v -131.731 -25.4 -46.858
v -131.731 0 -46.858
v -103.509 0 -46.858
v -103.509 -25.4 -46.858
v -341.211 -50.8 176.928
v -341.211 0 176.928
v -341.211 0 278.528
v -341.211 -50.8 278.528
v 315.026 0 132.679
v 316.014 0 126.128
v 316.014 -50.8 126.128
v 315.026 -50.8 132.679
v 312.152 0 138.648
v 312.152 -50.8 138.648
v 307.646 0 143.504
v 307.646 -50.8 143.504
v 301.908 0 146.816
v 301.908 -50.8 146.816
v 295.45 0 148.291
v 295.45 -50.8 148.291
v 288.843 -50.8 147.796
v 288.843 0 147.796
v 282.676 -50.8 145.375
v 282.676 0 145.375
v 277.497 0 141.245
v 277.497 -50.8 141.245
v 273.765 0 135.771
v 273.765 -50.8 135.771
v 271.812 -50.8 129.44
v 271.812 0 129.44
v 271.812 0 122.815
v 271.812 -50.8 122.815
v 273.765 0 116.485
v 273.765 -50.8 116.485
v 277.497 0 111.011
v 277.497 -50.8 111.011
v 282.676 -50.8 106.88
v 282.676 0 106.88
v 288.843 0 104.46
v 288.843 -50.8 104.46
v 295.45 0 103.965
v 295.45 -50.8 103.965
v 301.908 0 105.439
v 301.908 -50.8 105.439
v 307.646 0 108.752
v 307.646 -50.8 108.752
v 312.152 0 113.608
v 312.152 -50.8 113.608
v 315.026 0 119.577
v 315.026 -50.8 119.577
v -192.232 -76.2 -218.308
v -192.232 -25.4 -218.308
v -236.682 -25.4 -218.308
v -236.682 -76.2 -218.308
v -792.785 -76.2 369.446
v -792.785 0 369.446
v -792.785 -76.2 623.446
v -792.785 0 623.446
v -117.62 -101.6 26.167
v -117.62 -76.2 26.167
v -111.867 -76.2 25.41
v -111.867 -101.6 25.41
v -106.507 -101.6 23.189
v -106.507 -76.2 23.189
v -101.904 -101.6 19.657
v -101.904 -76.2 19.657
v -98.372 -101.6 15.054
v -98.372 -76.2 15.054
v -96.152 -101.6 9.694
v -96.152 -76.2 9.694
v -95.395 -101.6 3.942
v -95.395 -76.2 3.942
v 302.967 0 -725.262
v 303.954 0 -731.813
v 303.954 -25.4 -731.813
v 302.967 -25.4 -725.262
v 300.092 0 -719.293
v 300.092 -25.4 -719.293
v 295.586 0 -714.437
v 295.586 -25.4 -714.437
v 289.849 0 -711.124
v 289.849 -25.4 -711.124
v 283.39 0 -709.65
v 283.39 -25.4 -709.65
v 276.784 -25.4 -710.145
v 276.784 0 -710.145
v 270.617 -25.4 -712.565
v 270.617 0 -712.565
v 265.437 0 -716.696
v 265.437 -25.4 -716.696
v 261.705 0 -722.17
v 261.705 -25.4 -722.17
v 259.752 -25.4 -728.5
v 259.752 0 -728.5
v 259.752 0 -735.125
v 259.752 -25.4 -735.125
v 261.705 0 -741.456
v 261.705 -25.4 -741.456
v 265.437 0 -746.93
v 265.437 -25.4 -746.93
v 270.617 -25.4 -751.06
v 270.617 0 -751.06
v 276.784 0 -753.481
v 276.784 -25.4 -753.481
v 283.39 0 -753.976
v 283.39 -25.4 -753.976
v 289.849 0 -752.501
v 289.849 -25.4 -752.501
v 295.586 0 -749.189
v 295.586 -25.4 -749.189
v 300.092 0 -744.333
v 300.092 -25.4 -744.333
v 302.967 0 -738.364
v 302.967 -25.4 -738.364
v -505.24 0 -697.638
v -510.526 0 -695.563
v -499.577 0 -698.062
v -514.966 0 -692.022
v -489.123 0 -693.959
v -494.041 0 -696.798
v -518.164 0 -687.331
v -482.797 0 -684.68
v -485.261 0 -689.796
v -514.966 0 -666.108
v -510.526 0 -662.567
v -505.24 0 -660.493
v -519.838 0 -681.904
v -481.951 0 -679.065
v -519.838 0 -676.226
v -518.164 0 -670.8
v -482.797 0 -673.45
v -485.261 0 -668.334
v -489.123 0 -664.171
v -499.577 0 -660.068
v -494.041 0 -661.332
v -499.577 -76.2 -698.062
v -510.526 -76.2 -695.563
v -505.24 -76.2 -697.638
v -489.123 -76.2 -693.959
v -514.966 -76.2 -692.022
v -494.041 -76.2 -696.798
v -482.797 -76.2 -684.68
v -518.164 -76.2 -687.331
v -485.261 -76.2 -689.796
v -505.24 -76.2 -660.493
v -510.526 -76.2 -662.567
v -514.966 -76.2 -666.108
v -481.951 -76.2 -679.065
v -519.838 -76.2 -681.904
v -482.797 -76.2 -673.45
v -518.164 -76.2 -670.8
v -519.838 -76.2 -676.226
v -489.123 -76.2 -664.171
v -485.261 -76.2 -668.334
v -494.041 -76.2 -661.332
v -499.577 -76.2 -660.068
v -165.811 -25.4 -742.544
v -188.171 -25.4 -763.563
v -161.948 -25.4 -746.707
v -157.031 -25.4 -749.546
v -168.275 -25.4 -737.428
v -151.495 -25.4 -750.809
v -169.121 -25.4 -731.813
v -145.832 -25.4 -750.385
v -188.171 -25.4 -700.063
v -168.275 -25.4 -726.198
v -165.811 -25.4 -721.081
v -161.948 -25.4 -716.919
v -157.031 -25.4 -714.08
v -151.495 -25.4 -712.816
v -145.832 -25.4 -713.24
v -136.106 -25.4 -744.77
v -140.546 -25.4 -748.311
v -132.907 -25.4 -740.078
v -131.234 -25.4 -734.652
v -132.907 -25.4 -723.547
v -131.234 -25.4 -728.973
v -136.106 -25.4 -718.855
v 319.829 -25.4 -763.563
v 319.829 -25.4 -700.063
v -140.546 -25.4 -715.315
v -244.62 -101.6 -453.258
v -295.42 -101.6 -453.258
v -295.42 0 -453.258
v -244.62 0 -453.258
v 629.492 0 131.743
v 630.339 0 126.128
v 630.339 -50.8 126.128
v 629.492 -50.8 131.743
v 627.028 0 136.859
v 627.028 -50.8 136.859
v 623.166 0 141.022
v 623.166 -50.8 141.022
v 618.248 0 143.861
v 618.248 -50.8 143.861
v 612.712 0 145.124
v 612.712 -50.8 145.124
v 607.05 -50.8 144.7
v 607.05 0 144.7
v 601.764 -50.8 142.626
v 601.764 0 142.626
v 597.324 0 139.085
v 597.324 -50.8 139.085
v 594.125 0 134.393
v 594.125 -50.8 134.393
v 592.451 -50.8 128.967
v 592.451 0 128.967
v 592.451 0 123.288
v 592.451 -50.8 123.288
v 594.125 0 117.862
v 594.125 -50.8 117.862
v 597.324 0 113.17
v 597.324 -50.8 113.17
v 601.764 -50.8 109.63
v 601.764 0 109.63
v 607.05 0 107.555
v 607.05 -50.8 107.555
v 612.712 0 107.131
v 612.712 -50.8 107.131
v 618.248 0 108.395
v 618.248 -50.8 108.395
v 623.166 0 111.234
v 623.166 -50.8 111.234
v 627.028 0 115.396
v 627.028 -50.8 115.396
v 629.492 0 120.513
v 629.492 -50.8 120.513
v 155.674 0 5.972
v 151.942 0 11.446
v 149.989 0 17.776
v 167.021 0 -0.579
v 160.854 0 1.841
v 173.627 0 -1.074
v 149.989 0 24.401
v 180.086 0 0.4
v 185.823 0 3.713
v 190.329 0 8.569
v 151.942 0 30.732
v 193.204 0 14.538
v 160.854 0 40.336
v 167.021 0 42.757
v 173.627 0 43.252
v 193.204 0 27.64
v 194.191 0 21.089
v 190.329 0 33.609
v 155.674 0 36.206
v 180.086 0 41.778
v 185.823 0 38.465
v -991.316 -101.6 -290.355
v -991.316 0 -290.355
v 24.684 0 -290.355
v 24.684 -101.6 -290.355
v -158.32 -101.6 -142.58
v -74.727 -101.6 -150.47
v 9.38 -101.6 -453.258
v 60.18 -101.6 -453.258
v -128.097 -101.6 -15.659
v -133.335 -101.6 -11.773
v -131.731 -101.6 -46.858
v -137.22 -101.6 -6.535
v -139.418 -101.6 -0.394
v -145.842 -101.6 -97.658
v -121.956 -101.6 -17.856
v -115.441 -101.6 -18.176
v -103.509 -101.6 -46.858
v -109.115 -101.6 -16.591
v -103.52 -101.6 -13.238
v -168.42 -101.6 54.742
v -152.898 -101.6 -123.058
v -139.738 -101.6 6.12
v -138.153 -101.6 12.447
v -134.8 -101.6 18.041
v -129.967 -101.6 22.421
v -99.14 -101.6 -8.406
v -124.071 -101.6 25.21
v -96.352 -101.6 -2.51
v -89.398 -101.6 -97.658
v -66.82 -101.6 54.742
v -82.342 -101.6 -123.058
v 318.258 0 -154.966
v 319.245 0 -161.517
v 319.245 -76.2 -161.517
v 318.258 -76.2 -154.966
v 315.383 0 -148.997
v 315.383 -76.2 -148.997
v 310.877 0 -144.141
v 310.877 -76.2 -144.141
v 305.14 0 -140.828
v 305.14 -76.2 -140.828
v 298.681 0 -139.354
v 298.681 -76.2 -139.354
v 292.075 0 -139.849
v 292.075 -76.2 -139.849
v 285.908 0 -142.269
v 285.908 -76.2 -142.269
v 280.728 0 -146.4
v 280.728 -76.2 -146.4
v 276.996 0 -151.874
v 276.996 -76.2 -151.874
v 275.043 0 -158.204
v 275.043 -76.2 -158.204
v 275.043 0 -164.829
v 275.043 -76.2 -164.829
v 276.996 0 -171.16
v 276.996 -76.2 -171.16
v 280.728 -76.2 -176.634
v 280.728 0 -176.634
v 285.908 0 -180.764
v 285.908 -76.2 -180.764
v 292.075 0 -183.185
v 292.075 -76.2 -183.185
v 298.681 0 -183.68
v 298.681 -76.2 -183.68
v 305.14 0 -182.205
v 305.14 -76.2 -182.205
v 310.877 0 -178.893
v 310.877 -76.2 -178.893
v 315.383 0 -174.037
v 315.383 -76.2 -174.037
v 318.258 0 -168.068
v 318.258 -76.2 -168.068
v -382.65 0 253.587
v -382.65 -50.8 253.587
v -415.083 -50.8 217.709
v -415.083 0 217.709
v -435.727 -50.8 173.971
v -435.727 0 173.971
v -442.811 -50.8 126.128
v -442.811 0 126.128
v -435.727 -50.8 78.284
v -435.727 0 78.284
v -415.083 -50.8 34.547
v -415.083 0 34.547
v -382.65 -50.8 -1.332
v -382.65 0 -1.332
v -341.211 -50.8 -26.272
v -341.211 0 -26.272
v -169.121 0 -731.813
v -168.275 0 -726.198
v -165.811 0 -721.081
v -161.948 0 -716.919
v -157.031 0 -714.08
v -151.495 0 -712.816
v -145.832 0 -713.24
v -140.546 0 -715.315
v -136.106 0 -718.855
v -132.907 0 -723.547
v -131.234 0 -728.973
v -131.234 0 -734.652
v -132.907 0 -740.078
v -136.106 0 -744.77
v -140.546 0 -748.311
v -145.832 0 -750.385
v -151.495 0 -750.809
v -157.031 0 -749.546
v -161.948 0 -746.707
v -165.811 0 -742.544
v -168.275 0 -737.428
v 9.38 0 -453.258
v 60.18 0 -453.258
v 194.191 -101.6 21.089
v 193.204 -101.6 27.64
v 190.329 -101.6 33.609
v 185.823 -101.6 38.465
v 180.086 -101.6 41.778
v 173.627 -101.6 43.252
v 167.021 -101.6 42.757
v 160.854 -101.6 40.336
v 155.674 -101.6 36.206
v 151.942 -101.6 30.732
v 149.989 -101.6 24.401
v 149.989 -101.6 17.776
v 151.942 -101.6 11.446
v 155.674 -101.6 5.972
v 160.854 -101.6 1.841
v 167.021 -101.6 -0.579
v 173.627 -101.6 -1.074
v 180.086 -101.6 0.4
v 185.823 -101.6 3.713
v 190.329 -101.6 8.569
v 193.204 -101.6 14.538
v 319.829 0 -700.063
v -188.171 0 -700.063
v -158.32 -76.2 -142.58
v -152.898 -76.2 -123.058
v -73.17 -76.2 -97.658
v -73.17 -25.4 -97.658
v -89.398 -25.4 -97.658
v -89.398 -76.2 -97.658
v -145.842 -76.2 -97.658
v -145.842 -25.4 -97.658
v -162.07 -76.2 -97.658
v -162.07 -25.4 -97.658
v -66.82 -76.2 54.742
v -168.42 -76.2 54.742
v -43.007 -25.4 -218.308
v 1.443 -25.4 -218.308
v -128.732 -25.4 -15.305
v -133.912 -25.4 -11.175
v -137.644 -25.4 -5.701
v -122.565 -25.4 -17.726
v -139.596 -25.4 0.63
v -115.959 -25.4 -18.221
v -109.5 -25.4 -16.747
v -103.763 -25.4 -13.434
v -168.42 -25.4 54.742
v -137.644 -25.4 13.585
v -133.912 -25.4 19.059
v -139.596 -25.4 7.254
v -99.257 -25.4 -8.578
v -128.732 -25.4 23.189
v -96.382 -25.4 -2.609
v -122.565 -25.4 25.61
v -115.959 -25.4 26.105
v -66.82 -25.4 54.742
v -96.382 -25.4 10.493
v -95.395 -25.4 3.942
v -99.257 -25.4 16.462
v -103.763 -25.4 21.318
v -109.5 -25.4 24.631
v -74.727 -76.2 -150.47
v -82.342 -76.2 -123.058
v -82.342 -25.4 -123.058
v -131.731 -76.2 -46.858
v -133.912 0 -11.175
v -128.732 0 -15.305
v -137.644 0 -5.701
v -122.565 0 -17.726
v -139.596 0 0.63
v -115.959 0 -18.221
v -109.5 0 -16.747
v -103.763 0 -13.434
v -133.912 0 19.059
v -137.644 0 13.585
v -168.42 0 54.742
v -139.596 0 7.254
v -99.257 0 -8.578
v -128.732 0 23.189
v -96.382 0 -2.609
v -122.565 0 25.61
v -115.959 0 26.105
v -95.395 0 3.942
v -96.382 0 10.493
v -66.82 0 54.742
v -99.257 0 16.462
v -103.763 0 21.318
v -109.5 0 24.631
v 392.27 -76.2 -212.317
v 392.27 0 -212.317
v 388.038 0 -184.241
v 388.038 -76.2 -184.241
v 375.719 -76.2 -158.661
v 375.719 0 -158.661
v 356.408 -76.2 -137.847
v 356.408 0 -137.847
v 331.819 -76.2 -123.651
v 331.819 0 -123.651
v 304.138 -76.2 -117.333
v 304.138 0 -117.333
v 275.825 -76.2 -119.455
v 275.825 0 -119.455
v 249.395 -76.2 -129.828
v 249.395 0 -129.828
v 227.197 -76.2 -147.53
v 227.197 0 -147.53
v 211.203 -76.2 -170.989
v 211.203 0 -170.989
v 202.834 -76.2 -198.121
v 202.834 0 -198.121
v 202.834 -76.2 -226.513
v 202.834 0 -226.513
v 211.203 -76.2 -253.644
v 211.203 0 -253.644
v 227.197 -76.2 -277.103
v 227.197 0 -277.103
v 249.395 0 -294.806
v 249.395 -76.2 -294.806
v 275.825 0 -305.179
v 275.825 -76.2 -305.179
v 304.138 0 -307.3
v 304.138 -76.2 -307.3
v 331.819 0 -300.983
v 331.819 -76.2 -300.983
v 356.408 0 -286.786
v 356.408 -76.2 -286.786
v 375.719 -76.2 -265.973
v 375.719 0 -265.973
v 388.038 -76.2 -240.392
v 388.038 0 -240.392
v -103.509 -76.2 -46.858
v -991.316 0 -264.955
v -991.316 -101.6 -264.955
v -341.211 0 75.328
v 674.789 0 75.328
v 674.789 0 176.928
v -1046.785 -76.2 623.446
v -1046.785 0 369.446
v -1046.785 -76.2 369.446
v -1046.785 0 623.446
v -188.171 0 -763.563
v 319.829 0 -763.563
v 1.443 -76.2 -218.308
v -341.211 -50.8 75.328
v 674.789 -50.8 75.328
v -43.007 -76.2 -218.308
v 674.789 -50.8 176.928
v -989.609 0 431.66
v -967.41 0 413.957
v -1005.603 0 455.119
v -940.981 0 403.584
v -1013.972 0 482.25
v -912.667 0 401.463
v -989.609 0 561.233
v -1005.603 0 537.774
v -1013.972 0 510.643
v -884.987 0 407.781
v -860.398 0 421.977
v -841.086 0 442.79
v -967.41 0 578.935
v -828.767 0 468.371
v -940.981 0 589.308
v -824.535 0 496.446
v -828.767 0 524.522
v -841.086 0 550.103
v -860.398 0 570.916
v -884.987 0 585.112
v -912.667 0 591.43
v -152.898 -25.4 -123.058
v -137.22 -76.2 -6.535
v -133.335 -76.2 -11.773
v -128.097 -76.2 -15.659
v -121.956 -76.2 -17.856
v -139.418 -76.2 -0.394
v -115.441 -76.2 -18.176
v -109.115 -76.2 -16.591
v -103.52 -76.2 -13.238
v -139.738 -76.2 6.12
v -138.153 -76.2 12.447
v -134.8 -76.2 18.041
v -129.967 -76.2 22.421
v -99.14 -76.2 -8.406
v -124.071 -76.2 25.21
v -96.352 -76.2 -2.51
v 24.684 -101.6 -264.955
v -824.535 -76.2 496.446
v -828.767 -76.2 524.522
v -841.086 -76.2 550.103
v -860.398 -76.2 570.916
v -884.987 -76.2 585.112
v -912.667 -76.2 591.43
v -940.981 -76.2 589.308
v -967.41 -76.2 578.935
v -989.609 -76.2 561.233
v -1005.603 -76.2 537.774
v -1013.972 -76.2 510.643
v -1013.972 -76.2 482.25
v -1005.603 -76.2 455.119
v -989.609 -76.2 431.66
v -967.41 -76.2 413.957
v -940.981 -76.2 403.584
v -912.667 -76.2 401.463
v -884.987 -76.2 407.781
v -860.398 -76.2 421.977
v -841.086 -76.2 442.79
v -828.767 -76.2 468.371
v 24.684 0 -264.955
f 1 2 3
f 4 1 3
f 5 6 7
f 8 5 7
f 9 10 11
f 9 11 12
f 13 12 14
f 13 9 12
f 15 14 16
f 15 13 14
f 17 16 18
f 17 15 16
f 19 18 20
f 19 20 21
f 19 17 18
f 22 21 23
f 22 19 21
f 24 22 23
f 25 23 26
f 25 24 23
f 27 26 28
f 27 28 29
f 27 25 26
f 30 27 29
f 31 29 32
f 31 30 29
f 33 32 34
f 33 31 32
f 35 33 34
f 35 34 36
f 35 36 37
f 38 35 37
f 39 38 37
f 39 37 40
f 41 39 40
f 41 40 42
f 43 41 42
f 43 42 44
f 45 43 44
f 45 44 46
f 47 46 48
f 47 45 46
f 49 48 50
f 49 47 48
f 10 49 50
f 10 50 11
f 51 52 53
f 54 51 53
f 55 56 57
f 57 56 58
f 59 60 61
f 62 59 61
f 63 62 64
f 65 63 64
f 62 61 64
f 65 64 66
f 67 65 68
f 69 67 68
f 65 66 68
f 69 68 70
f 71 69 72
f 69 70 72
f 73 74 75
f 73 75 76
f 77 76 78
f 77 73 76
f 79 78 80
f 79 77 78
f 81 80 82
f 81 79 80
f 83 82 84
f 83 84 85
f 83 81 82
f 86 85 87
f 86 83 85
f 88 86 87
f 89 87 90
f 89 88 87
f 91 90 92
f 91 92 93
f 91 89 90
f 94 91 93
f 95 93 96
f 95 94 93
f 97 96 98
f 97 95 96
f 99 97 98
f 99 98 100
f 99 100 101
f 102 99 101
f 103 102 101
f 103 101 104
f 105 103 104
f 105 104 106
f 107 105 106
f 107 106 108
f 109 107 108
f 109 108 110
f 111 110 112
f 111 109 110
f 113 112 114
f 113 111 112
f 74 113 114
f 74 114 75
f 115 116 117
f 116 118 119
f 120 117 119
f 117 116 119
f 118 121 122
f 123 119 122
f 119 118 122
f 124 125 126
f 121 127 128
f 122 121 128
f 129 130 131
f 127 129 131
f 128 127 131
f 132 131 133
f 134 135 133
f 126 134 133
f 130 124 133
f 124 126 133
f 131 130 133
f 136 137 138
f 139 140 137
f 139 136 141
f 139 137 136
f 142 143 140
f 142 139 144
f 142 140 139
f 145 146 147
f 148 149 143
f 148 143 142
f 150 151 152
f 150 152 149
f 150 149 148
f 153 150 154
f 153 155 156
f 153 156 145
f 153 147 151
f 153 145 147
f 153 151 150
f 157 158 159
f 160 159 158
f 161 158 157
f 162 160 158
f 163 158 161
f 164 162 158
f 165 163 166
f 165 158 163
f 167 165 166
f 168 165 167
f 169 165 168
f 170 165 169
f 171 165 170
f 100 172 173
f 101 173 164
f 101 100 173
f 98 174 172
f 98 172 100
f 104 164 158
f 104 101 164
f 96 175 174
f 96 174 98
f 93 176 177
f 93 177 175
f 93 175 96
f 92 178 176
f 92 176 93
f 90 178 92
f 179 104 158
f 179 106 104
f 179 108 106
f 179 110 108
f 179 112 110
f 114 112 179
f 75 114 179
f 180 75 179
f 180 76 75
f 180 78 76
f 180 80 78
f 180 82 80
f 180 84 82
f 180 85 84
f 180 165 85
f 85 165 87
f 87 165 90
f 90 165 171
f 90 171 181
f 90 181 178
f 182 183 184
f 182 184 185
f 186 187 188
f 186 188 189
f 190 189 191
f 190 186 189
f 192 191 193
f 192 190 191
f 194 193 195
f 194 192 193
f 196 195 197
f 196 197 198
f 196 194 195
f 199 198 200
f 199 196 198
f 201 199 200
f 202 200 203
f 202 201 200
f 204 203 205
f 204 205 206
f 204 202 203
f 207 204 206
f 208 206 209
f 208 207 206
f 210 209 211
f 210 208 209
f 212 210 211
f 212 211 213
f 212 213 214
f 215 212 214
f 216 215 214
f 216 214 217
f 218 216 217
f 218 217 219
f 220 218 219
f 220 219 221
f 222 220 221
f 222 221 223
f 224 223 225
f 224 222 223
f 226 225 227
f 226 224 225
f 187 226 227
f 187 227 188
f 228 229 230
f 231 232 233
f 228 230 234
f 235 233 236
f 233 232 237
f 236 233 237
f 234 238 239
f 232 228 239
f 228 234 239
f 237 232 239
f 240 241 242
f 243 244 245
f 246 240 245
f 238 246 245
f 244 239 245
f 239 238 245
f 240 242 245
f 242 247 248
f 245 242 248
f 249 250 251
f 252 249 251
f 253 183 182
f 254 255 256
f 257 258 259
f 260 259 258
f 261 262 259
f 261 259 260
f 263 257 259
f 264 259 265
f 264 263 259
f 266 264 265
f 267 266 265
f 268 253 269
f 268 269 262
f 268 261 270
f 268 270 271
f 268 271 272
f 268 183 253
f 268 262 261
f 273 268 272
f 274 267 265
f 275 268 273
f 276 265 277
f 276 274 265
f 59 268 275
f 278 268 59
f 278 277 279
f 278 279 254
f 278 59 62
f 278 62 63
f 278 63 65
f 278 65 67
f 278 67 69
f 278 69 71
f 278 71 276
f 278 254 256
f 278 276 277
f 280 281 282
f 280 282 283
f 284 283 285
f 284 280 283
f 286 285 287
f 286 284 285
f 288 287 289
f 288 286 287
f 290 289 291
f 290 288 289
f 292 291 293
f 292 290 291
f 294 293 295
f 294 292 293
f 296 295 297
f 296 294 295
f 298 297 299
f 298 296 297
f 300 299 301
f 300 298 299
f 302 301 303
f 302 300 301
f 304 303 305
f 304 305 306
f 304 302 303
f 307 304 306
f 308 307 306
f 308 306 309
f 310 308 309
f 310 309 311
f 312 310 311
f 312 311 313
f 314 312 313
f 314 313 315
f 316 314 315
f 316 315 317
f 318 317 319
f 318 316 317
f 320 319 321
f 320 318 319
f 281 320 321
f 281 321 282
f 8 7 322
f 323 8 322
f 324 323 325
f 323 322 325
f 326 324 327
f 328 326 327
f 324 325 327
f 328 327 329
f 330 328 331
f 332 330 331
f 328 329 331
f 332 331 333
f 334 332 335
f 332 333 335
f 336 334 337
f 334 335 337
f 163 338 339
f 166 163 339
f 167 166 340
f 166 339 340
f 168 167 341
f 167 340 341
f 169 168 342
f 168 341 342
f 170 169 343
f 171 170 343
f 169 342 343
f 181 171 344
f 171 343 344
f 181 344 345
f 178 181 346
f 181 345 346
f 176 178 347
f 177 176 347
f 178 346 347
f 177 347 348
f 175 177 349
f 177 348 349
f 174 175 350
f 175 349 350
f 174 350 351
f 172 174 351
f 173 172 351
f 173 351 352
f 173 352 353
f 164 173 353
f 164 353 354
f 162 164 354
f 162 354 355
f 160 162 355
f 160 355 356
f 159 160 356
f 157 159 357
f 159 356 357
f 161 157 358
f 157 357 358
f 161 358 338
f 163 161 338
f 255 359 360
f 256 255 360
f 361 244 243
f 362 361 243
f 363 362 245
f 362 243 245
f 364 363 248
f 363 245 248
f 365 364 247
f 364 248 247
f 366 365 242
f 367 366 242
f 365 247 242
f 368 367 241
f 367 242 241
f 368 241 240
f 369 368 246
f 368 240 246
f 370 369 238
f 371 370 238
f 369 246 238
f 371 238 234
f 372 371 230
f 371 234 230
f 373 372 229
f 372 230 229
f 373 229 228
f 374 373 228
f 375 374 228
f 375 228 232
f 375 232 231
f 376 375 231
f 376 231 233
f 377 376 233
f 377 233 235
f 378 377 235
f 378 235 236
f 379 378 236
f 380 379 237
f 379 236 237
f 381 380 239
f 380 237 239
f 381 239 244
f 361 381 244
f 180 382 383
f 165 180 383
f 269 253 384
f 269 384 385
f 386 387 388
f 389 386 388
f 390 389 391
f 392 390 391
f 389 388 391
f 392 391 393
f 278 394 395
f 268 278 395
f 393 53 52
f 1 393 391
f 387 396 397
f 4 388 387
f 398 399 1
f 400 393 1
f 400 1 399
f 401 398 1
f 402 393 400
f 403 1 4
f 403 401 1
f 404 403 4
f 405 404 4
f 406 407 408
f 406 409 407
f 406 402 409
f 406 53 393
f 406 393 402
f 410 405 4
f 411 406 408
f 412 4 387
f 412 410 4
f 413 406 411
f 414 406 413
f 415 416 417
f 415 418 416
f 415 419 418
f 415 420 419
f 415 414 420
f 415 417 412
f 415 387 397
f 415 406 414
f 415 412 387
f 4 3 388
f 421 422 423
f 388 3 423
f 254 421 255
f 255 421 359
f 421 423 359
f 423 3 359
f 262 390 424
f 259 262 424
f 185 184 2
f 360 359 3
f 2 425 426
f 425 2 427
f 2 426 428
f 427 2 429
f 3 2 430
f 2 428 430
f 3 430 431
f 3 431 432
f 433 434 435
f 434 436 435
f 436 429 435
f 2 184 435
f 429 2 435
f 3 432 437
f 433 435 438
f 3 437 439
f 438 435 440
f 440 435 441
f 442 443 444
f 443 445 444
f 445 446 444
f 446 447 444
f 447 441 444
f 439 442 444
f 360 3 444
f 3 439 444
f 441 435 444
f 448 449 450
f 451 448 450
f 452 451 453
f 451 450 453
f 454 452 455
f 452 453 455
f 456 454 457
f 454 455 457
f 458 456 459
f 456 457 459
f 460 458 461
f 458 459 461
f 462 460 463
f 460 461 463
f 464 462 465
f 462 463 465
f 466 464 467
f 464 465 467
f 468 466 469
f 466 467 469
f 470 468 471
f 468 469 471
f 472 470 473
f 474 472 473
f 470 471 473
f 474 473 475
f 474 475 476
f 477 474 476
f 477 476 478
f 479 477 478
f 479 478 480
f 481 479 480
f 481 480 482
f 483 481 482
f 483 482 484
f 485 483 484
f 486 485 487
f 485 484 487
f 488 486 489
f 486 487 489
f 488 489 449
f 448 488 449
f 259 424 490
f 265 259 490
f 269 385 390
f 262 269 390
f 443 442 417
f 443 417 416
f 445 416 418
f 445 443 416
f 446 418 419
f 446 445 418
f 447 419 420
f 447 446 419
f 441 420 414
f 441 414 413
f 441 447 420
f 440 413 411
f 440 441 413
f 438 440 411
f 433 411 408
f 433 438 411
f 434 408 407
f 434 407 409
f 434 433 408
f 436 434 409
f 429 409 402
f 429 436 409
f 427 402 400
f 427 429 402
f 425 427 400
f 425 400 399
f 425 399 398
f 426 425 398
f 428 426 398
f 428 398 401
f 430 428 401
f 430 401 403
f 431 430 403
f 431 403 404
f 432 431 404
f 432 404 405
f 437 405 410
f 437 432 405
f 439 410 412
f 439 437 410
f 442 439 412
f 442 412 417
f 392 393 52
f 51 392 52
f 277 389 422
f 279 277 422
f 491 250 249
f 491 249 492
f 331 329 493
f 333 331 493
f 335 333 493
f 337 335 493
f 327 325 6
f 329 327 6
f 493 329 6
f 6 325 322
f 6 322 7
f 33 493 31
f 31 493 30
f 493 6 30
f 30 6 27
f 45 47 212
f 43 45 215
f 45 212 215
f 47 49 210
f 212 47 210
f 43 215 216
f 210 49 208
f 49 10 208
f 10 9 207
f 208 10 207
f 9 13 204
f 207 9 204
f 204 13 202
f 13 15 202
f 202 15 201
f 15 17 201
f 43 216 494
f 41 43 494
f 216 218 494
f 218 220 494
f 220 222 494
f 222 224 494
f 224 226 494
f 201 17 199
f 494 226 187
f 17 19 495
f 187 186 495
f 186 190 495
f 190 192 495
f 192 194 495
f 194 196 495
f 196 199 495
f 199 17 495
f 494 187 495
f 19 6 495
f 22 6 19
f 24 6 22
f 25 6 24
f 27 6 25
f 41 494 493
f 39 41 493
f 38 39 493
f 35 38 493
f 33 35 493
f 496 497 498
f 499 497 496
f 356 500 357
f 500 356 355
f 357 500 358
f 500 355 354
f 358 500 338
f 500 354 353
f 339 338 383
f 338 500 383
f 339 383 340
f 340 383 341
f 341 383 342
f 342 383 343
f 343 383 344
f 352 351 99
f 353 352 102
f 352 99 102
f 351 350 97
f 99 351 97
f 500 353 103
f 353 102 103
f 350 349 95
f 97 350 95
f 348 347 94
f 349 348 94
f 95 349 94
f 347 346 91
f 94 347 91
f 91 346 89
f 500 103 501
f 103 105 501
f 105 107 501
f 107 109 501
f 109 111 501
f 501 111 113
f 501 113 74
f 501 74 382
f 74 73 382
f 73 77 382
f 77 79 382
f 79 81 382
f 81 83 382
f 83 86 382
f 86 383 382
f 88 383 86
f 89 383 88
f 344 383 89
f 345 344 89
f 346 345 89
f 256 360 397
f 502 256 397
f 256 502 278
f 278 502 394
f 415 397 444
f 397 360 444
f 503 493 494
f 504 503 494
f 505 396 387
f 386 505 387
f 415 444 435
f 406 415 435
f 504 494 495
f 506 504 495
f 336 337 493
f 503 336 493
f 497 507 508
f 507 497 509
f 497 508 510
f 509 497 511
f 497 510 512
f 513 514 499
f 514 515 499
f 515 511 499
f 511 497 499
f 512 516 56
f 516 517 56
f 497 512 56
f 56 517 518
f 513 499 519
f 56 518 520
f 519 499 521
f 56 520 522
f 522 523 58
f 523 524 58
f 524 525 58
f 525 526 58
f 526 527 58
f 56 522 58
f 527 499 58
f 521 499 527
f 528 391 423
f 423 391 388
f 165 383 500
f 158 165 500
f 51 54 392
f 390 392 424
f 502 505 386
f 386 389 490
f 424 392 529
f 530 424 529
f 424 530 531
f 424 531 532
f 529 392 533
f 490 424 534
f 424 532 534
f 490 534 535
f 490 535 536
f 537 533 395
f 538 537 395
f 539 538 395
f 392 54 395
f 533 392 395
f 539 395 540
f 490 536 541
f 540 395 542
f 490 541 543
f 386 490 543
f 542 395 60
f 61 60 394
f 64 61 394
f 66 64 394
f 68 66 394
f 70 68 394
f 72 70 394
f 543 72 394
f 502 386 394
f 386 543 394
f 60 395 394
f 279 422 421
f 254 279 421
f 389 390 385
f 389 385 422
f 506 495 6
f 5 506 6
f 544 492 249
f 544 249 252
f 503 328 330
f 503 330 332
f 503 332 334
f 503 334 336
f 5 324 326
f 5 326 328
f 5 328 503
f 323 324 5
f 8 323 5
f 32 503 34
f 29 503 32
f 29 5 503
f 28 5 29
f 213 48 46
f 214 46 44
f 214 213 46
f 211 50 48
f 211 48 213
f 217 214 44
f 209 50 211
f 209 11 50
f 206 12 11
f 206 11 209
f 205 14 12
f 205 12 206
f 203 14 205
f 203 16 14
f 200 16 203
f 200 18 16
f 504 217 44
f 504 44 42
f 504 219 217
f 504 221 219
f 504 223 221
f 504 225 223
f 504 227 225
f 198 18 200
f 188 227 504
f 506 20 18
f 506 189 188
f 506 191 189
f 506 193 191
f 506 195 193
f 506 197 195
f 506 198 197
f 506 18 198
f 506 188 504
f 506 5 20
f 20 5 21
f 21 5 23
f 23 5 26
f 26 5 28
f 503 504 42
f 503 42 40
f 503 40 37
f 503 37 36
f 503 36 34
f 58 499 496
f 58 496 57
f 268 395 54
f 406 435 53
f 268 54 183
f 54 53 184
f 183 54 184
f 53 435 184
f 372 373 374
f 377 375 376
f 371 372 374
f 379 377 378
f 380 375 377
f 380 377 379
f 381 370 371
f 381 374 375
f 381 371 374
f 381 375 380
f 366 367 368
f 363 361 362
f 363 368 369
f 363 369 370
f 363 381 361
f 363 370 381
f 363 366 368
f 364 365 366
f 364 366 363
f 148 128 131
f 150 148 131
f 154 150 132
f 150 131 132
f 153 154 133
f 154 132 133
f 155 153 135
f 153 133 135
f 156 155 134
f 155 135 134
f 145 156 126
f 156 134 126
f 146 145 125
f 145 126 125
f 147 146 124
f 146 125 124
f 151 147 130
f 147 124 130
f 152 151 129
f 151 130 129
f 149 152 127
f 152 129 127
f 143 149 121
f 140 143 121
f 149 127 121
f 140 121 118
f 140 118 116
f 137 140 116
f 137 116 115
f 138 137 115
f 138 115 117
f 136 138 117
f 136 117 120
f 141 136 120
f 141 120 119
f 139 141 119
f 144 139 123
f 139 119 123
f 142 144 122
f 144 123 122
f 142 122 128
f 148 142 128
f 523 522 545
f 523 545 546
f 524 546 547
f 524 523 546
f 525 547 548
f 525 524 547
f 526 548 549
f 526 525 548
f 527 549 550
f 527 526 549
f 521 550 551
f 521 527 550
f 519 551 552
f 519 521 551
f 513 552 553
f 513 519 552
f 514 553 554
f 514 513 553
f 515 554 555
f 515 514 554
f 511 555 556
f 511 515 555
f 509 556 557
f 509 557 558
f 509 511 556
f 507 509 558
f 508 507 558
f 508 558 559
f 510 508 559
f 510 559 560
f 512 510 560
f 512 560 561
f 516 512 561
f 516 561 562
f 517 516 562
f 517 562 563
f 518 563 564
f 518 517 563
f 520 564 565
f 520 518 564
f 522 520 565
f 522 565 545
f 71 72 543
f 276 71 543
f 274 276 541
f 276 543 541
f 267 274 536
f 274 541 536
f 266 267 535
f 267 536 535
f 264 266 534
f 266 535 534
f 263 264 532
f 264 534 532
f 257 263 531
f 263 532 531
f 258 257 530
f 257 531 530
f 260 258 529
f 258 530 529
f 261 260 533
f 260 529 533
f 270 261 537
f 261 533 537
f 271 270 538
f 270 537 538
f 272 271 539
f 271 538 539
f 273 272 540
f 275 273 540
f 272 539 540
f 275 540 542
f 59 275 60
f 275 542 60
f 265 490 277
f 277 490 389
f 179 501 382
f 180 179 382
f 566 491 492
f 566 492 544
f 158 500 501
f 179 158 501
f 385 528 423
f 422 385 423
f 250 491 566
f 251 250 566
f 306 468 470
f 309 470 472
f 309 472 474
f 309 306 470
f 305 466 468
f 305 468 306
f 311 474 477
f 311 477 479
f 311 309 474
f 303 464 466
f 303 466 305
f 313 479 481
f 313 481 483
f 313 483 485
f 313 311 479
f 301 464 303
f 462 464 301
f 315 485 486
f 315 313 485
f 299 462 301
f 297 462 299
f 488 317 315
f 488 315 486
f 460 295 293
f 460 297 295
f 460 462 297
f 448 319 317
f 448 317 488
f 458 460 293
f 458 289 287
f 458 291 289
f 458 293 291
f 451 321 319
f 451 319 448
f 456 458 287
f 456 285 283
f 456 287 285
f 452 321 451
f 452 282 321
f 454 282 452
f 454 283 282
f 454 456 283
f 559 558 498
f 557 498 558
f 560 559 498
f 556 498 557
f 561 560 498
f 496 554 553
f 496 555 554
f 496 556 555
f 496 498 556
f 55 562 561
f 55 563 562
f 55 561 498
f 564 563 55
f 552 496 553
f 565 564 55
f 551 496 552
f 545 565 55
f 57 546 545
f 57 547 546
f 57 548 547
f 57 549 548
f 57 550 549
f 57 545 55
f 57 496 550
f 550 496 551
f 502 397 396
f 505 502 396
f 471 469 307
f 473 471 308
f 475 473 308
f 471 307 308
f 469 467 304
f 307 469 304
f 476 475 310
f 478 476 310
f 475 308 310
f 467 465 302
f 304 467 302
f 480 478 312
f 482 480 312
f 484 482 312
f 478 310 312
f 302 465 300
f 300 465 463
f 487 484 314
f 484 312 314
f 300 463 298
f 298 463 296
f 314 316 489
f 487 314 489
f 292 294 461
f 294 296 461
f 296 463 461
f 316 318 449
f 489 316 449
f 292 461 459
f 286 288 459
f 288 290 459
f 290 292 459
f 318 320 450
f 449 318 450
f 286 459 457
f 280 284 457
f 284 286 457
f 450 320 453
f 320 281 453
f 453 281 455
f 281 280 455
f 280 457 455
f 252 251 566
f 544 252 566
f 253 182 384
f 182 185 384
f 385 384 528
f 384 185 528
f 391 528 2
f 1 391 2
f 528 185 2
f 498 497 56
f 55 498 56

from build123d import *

# Parameters (mm, degrees)
F0_R      = 22.225
F0_R_2    = 19.05
F1_DEPTH  = 50.8
F2_R      = 22.225
F3_DEPTH  = 25.4
F5_DEPTH  = 50.8
F7_DEPTH  = 25.4
F8_R      = 22.225
F9_DEPTH  = 101.6
F10_R     = 95.25
F10_R_2   = 22.225
F11_DEPTH = 76.2
F12_R     = 19.05
F13_DEPTH = 76.2
F14_R     = 22.225
F15_DEPTH = 25.4
F16_W     = 254
F16_H     = 254
F16_R     = 95.25
F17_DEPTH = 76.2
F18_W     = 1016
F18_H     = 25.4
F19_DEPTH = 101.6


with BuildPart() as f1:
    # F0 (on Front) → F1 (new body)
    with BuildSketch(Plane.XZ):
        with BuildLine():
            Line((674.7886301041, 176.9277313841), (-341.2113698959, 176.9277313841))
            Line((-341.2113698959, 176.9277313841), (-341.2113698959, 278.5277313841))
            ThreePointArc((-341.2113698959, 278.5277313841), (-442.8113698959, 126.1277313841), (-341.2113698959, -26.2722686159))
            Line((-341.2113698959, -26.2722686159), (-341.2113698959, 75.3277313841))
            Line((-341.2113698959, 75.3277313841), (674.7886301041, 75.3277313841))
            Line((674.7886301041, 75.3277313841), (674.7886301041, 176.9277313841))
        make_face()
        with Locations((293.7886301041, 126.1277313841)):
            Circle(F0_R, mode=Mode.SUBTRACT)
        with Locations((611.2886301041, 126.1277313841)):
            Circle(F0_R_2, mode=Mode.SUBTRACT)
    extrude(amount=F1_DEPTH)


with BuildPart() as f3:
    # F2 (on Front) → F3 (new body)
    with BuildSketch(Plane.XZ):
        Polygon((-117.6197227955, 54.7419947535), (-168.4197227955, 54.7419947535), (-295.4197227955, -453.2580052465), (-244.6197227955, -453.2580052465), (-131.7308339066, -46.8580052465), (-103.5086116844, -46.8580052465), (9.3802772045, -453.2580052465), (60.1802772045, -453.2580052465), (-66.8197227955, 54.7419947535), align=None)
        with Locations((-117.6197227955, 3.9419947535)):
            Circle(F2_R, mode=Mode.SUBTRACT)
    extrude(amount=F3_DEPTH)

    # F4 (on face) → F5 (join)
    with BuildSketch(Plane.XZ.offset(25.4)):
        Polygon((-73.1697227955, -97.6580052465), (-89.3975005733, -97.6580052465), (-82.3419450177, -123.0580052465), (9.3802772045, -453.2580052465), (60.1802772045, -453.2580052465), (1.4427772045, -218.3080052465), (-43.0072227955, -218.3080052465), align=None)
        Polygon((-152.8975005733, -123.0580052465), (-145.8419450177, -97.6580052465), (-162.0697227955, -97.6580052465), (-192.2322227955, -218.3080052465), (-236.6822227955, -218.3080052465), (-295.4197227955, -453.2580052465), (-244.6197227955, -453.2580052465), align=None)
        Polygon((-89.3975005733, -97.6580052465), (-145.8419450177, -97.6580052465), (-152.8975005733, -123.0580052465), (-82.3419450177, -123.0580052465), align=None)
    extrude(amount=F5_DEPTH)

    # F6 (on face) → F7 (join)
    with BuildSketch(Plane.XZ.offset(76.2)):
        Polygon((-43.0072227955, -218.3080052465), (1.4427772045, -218.3080052465), (-66.8197227955, 54.7419947535), (-117.6197227955, 54.7419947535), (-168.4197227955, 54.7419947535), (-236.6822227955, -218.3080052465), (-192.2322227955, -218.3080052465), (-162.0697227955, -97.6580052465), (-145.8419450177, -97.6580052465), (-131.7308339066, -46.8580052465), (-103.5086116844, -46.8580052465), (-89.3975005733, -97.6580052465), (-73.1697227955, -97.6580052465), align=None)
        with BuildLine():
            ThreePointArc((-95.3947227955, 3.9419947535), (-133.3351710074, -11.7734534584), (-117.6197227955, 26.1669947535))
            ThreePointArc((-117.6197227955, 26.1669947535), (-101.9042745836, 19.6574429654), (-95.3947227955, 3.9419947535))
        make_face(mode=Mode.SUBTRACT)
        Polygon((-158.3203805236, -142.5803730679), (-152.8975005733, -123.0580052465), (-145.8419450177, -97.6580052465), (-162.0697227955, -97.6580052465), (-192.2322227955, -218.3080052465), (-236.6822227955, -218.3080052465), (-295.4197227955, -453.2580052465), (-244.6197227955, -453.2580052465), align=None)
        Polygon((9.3802772045, -453.2580052465), (60.1802772045, -453.2580052465), (1.4427772045, -218.3080052465), (-43.0072227955, -218.3080052465), (-73.1697227955, -97.6580052465), (-89.3975005733, -97.6580052465), (-82.3419450177, -123.0580052465), (-74.7274909157, -150.4700400139), align=None)
    extrude(amount=F7_DEPTH)


with BuildPart() as f9:
    # F8 (on Front) → F9 (new body)
    with BuildSketch(Plane.XZ):
        with Locations((171.9661206007, 21.0888702422)):
            Circle(F8_R)
    extrude(amount=F9_DEPTH)


with BuildPart() as f11:
    # F10 (on Front) → F11 (new body)
    with BuildSketch(Plane.XZ):
        with Locations((297.0201671124, -212.3168110847)):
            Circle(F10_R)
        with Locations((297.0201671124, -161.5168110847)):
            Circle(F10_R_2, mode=Mode.SUBTRACT)
    extrude(amount=F11_DEPTH)


with BuildPart() as f13:
    # F12 (on Front) → F13 (new body)
    with BuildSketch(Plane.XZ):
        with Locations((-501.0008811951, -679.0651679039)):
            Circle(F12_R)
    extrude(amount=F13_DEPTH)


with BuildPart() as f15:
    # F14 (on Front) → F15 (new body)
    with BuildSketch(Plane.XZ):
        Polygon((243.6290978968, -700.0627458964), (-111.9709021032, -700.0627458964), (-111.9709021032, -731.8127458964), (-111.9709021032, -763.5627458964), (243.6290978968, -763.5627458964), align=None)
        with BuildLine():
            Line((-169.1209021032, -731.8127458964), (-188.1709021032, -731.8127458964))
            Line((-188.1709021032, -731.8127458964), (-188.1709021032, -763.5627458964))
            Line((-188.1709021032, -763.5627458964), (-111.9709021032, -763.5627458964))
            Line((-111.9709021032, -763.5627458964), (-111.9709021032, -731.8127458964))
            Line((-111.9709021032, -731.8127458964), (-131.0209021032, -731.8127458964))
            ThreePointArc((-131.0209021032, -731.8127458964), (-150.0709021032, -750.8627458964), (-169.1209021032, -731.8127458964))
        make_face()
        with BuildLine():
            Line((-111.9709021032, -700.0627458964), (-188.1709021032, -700.0627458964))
            Line((-188.1709021032, -700.0627458964), (-188.1709021032, -731.8127458964))
            Line((-188.1709021032, -731.8127458964), (-169.1209021032, -731.8127458964))
            ThreePointArc((-169.1209021032, -731.8127458964), (-150.0709021032, -712.7627458964), (-131.0209021032, -731.8127458964))
            Line((-131.0209021032, -731.8127458964), (-111.9709021032, -731.8127458964))
            Line((-111.9709021032, -731.8127458964), (-111.9709021032, -700.0627458964))
        make_face()
        Polygon((319.8290978968, -700.0627458964), (243.6290978968, -700.0627458964), (243.6290978968, -763.5627458964), (319.8290978968, -763.5627458964), (319.8290978968, -731.8127458964), align=None)
        with Locations((281.7290978968, -731.8127458964)):
            Circle(F14_R, mode=Mode.SUBTRACT)
    extrude(amount=F15_DEPTH)


with BuildPart() as f17:
    # F16 (on Front) → F17 (new body)
    with BuildSketch(Plane.XZ):
        with Locations((-919.7853881174, 496.4463600467)):
            Rectangle(F16_W, F16_H)
        with Locations((-919.7853881174, 496.4463600467)):
            Circle(F16_R, mode=Mode.SUBTRACT)
    extrude(amount=F17_DEPTH)


with BuildPart() as f19:
    # F18 (on Front) → F19 (new body)
    with BuildSketch(Plane.XZ):
        with Locations((-483.3161662409, -277.6545584202)):
            Rectangle(F18_W, F18_H)
    extrude(amount=F19_DEPTH)


solid = Compound([f1.part, f3.part, f9.part, f11.part, f13.part, f15.part, f17.part, f19.part])
